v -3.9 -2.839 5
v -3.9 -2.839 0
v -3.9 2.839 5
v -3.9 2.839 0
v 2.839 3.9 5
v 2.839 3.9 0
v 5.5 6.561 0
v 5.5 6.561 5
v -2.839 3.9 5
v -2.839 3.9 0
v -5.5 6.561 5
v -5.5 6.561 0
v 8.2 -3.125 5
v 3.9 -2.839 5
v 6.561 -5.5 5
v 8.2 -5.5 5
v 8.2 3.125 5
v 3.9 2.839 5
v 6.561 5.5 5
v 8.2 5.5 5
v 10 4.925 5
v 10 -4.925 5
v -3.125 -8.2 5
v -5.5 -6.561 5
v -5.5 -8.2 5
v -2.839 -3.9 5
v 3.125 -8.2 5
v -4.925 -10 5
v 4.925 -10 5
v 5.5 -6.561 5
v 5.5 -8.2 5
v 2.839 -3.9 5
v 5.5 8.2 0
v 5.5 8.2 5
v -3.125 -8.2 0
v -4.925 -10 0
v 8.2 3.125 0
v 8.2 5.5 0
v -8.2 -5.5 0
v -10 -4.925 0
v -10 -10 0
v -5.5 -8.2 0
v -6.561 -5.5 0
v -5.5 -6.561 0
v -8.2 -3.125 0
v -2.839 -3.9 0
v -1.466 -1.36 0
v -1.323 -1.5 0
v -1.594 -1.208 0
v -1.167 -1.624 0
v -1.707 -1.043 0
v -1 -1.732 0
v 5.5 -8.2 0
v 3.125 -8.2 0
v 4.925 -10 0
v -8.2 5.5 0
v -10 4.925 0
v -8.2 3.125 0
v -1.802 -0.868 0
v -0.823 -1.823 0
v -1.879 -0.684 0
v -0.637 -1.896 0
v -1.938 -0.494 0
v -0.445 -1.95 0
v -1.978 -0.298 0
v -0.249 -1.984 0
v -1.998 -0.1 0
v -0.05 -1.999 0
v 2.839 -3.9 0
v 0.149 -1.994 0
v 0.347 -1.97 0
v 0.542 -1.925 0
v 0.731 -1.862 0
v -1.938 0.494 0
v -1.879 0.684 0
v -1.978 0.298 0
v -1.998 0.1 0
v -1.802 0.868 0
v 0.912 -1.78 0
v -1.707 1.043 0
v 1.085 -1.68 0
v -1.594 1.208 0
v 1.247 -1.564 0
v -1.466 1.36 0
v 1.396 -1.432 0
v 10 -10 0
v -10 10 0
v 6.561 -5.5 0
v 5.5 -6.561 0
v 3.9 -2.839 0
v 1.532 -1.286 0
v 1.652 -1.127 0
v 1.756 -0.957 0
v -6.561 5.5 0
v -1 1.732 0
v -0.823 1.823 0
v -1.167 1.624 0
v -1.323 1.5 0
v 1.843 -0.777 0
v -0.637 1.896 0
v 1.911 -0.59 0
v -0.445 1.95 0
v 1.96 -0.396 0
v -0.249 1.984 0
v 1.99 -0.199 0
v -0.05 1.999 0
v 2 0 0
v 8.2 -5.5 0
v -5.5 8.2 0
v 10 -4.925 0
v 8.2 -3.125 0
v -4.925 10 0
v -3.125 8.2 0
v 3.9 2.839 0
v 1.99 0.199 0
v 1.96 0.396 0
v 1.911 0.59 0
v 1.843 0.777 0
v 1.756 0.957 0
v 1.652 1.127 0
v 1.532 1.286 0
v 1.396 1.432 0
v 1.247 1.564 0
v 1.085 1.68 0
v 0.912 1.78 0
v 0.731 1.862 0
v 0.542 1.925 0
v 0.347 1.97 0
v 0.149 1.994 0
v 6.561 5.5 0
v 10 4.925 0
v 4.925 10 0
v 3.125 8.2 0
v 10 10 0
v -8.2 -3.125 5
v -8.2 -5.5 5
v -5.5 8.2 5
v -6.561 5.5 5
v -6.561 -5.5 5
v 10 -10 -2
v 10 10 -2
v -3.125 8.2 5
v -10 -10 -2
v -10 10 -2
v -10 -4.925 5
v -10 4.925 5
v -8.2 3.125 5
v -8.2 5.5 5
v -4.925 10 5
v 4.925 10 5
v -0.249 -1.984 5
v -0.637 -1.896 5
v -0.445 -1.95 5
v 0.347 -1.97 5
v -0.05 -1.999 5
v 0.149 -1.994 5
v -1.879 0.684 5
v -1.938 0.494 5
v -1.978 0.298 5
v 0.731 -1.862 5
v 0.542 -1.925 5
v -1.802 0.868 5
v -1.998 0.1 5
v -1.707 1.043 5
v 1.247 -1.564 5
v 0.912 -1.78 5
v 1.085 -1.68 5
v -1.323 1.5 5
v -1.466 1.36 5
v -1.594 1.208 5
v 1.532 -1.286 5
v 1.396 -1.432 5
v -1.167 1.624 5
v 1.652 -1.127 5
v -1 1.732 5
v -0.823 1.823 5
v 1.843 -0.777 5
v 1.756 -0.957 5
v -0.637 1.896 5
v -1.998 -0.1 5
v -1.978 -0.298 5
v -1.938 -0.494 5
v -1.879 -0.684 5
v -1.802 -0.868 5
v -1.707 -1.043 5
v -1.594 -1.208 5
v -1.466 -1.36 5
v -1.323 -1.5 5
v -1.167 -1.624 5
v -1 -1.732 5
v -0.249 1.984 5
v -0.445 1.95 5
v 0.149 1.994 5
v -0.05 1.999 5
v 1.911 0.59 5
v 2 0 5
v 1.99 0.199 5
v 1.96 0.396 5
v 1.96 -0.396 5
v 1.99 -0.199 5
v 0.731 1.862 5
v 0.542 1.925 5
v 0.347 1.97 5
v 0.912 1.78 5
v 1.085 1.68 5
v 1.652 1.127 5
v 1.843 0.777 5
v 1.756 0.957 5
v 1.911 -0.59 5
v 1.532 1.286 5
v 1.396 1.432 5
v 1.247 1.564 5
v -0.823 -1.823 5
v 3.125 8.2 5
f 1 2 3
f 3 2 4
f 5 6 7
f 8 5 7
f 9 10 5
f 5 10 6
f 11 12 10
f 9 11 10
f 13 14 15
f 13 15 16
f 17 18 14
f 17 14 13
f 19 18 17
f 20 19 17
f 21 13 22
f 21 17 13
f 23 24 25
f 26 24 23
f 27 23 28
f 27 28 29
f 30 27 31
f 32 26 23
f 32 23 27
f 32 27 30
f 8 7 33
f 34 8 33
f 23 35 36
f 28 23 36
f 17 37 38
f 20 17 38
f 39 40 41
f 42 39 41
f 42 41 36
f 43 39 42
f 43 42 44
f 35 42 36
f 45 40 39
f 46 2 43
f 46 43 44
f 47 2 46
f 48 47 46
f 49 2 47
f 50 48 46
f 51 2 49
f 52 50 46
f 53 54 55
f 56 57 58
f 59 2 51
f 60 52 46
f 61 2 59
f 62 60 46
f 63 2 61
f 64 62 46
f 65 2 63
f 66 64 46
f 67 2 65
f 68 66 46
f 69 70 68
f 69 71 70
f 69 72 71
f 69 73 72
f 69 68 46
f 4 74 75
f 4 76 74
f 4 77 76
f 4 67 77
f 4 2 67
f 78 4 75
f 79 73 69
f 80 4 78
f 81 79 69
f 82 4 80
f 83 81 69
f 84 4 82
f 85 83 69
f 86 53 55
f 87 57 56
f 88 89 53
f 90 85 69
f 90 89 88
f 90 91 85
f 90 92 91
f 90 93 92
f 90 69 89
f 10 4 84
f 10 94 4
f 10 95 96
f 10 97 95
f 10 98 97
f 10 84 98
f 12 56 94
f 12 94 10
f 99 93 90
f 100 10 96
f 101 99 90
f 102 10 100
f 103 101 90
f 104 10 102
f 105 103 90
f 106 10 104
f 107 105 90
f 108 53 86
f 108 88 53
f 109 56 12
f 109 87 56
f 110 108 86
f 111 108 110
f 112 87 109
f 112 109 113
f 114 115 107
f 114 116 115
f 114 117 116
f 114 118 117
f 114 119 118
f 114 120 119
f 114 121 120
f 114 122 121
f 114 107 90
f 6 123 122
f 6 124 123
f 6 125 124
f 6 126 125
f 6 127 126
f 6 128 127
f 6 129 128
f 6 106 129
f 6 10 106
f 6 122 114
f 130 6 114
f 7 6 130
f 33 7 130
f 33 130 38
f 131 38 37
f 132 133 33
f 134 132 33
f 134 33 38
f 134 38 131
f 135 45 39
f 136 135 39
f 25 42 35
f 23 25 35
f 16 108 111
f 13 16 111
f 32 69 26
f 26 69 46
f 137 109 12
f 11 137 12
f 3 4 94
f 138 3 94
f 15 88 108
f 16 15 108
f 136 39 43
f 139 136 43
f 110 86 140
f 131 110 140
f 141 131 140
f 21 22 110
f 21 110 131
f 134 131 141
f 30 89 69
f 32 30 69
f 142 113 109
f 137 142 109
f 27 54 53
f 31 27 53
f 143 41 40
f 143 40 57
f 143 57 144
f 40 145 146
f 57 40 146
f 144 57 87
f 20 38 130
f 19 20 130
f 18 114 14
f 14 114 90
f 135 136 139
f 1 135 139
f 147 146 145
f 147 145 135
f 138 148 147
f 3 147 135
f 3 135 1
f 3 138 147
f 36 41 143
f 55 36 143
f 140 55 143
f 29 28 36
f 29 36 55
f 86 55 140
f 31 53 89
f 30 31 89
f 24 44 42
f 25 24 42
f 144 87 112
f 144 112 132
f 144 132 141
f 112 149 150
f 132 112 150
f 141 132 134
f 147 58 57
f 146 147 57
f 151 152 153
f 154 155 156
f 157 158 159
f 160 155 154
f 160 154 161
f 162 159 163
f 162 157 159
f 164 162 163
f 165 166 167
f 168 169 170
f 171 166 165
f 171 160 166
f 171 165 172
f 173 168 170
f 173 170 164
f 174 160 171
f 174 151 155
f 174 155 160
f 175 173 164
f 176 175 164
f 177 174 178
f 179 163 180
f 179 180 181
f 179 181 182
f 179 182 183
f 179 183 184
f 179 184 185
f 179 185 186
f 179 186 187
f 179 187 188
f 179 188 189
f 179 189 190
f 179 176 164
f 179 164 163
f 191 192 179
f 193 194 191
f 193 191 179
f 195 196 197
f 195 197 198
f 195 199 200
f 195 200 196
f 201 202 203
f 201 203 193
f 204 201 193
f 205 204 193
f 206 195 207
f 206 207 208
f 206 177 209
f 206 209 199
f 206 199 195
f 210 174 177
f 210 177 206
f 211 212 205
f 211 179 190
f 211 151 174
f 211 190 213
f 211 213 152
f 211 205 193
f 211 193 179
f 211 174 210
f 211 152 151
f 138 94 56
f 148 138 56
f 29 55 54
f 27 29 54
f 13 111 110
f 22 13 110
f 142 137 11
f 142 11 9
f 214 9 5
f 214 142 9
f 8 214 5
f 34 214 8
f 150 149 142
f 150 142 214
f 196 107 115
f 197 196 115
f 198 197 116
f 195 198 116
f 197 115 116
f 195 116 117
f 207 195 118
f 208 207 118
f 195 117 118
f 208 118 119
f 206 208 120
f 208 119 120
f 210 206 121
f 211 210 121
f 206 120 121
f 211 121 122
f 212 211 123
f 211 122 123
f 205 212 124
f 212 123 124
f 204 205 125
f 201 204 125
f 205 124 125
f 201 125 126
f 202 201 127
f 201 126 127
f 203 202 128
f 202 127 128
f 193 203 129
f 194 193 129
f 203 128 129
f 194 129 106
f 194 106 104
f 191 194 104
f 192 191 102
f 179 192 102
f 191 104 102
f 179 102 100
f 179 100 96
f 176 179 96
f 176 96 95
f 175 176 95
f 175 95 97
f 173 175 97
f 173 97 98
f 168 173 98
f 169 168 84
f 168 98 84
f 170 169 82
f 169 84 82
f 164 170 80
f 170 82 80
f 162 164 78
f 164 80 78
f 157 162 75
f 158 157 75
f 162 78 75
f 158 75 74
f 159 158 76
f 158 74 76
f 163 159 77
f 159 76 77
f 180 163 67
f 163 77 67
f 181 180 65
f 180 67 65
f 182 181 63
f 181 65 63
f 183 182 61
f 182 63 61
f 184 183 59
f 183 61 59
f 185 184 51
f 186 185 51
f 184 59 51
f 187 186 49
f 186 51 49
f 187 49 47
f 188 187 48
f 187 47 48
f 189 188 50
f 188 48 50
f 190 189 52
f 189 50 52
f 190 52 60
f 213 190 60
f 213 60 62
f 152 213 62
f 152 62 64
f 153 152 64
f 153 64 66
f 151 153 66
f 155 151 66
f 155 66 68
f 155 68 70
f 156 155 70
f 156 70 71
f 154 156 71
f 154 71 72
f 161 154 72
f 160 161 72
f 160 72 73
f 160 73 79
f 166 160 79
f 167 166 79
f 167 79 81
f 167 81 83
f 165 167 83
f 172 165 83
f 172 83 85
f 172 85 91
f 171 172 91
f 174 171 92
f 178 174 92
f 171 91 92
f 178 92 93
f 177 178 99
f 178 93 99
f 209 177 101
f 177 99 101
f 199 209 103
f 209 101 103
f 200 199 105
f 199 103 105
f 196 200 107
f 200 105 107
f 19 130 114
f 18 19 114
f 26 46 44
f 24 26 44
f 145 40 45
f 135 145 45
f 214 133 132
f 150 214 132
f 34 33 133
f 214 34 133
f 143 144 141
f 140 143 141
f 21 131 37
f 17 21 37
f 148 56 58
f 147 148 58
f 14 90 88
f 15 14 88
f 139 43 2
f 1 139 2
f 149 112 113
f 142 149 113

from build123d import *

# Parameters (mm, degrees)
BOSS_EXTRUDE1_DEPTH   = 5
SKETCH1_R             = 2
BOSS_EXTRUDE1_2_DEPTH = 5
BOSS_EXTRUDE1_3_DEPTH = 5
BOSS_EXTRUDE1_4_DEPTH = 5
BOSS_EXTRUDE1_5_DEPTH = 5
SKETCH1_3_W           = 20
SKETCH1_3_H           = 20
BOSS_EXTRUDE2_DEPTH   = 2


with BuildPart() as part:
    # Sketch1 → Boss-Extrude1 (new body)
    with BuildSketch(Plane.XY):
        Polygon((4.925, 10), (-4.925, 10), (-3.125, 8.2), (-5.5, 8.2), (-5.5, 6.560660172), (-2.839339828, 3.9), (2.839339828, 3.9), (5.5, 6.560660172), (5.5, 8.2), (3.125, 8.2), align=None)
    extrude(amount=BOSS_EXTRUDE1_DEPTH)



with BuildPart() as body_2:
    # Sketch1 → Boss-Extrude1 2 (new body)
    with BuildSketch(Plane.XY):
        Circle(SKETCH1_R)
    extrude(amount=BOSS_EXTRUDE1_2_DEPTH)


with BuildPart() as body_3:
    # Sketch1 → Boss-Extrude1 3 (new body)
    with BuildSketch(Plane.XY):
        Polygon((10, -4.925), (10, 4.925), (8.2, 3.125), (8.2, 5.5), (6.560660172, 5.5), (3.9, 2.839339828), (3.9, -2.839339828), (6.560660172, -5.5), (8.2, -5.5), (8.2, -3.125), align=None)
    extrude(amount=BOSS_EXTRUDE1_3_DEPTH)


with BuildPart() as body_4:
    # Sketch1 → Boss-Extrude1 4 (new body)
    with BuildSketch(Plane.XY):
        Polygon((-8.2, 3.125), (-10, 4.925), (-10, -4.925), (-8.2, -3.125), (-8.2, -5.5), (-6.560660172, -5.5), (-3.9, -2.839339828), (-3.9, 2.839339828), (-6.560660172, 5.5), (-8.2, 5.5), align=None)
    extrude(amount=BOSS_EXTRUDE1_4_DEPTH)


with BuildPart() as body_5:
    # Sketch1 → Boss-Extrude1 5 (new body)
    with BuildSketch(Plane.XY):
        Polygon((-3.125, -8.2), (-4.925, -10), (4.925, -10), (3.125, -8.2), (5.5, -8.2), (5.5, -6.560660172), (2.839339828, -3.9), (-2.839339828, -3.9), (-5.5, -6.560660172), (-5.5, -8.2), align=None)
    extrude(amount=BOSS_EXTRUDE1_5_DEPTH)


with BuildPart() as part_1:
    add(part.part)

    add(body_2.part)  # Boss-Extrude2 merges body 2

    add(body_3.part)  # Boss-Extrude2 merges body 3

    add(body_4.part)  # Boss-Extrude2 merges body 4

    add(body_5.part)  # Boss-Extrude2 merges body 5
    # Sketch1<3> → Boss-Extrude2 (add)
    with BuildSketch(Plane.XY):
        Rectangle(SKETCH1_3_W, SKETCH1_3_H)
    extrude(amount=-BOSS_EXTRUDE2_DEPTH)


solid = part_1.part
